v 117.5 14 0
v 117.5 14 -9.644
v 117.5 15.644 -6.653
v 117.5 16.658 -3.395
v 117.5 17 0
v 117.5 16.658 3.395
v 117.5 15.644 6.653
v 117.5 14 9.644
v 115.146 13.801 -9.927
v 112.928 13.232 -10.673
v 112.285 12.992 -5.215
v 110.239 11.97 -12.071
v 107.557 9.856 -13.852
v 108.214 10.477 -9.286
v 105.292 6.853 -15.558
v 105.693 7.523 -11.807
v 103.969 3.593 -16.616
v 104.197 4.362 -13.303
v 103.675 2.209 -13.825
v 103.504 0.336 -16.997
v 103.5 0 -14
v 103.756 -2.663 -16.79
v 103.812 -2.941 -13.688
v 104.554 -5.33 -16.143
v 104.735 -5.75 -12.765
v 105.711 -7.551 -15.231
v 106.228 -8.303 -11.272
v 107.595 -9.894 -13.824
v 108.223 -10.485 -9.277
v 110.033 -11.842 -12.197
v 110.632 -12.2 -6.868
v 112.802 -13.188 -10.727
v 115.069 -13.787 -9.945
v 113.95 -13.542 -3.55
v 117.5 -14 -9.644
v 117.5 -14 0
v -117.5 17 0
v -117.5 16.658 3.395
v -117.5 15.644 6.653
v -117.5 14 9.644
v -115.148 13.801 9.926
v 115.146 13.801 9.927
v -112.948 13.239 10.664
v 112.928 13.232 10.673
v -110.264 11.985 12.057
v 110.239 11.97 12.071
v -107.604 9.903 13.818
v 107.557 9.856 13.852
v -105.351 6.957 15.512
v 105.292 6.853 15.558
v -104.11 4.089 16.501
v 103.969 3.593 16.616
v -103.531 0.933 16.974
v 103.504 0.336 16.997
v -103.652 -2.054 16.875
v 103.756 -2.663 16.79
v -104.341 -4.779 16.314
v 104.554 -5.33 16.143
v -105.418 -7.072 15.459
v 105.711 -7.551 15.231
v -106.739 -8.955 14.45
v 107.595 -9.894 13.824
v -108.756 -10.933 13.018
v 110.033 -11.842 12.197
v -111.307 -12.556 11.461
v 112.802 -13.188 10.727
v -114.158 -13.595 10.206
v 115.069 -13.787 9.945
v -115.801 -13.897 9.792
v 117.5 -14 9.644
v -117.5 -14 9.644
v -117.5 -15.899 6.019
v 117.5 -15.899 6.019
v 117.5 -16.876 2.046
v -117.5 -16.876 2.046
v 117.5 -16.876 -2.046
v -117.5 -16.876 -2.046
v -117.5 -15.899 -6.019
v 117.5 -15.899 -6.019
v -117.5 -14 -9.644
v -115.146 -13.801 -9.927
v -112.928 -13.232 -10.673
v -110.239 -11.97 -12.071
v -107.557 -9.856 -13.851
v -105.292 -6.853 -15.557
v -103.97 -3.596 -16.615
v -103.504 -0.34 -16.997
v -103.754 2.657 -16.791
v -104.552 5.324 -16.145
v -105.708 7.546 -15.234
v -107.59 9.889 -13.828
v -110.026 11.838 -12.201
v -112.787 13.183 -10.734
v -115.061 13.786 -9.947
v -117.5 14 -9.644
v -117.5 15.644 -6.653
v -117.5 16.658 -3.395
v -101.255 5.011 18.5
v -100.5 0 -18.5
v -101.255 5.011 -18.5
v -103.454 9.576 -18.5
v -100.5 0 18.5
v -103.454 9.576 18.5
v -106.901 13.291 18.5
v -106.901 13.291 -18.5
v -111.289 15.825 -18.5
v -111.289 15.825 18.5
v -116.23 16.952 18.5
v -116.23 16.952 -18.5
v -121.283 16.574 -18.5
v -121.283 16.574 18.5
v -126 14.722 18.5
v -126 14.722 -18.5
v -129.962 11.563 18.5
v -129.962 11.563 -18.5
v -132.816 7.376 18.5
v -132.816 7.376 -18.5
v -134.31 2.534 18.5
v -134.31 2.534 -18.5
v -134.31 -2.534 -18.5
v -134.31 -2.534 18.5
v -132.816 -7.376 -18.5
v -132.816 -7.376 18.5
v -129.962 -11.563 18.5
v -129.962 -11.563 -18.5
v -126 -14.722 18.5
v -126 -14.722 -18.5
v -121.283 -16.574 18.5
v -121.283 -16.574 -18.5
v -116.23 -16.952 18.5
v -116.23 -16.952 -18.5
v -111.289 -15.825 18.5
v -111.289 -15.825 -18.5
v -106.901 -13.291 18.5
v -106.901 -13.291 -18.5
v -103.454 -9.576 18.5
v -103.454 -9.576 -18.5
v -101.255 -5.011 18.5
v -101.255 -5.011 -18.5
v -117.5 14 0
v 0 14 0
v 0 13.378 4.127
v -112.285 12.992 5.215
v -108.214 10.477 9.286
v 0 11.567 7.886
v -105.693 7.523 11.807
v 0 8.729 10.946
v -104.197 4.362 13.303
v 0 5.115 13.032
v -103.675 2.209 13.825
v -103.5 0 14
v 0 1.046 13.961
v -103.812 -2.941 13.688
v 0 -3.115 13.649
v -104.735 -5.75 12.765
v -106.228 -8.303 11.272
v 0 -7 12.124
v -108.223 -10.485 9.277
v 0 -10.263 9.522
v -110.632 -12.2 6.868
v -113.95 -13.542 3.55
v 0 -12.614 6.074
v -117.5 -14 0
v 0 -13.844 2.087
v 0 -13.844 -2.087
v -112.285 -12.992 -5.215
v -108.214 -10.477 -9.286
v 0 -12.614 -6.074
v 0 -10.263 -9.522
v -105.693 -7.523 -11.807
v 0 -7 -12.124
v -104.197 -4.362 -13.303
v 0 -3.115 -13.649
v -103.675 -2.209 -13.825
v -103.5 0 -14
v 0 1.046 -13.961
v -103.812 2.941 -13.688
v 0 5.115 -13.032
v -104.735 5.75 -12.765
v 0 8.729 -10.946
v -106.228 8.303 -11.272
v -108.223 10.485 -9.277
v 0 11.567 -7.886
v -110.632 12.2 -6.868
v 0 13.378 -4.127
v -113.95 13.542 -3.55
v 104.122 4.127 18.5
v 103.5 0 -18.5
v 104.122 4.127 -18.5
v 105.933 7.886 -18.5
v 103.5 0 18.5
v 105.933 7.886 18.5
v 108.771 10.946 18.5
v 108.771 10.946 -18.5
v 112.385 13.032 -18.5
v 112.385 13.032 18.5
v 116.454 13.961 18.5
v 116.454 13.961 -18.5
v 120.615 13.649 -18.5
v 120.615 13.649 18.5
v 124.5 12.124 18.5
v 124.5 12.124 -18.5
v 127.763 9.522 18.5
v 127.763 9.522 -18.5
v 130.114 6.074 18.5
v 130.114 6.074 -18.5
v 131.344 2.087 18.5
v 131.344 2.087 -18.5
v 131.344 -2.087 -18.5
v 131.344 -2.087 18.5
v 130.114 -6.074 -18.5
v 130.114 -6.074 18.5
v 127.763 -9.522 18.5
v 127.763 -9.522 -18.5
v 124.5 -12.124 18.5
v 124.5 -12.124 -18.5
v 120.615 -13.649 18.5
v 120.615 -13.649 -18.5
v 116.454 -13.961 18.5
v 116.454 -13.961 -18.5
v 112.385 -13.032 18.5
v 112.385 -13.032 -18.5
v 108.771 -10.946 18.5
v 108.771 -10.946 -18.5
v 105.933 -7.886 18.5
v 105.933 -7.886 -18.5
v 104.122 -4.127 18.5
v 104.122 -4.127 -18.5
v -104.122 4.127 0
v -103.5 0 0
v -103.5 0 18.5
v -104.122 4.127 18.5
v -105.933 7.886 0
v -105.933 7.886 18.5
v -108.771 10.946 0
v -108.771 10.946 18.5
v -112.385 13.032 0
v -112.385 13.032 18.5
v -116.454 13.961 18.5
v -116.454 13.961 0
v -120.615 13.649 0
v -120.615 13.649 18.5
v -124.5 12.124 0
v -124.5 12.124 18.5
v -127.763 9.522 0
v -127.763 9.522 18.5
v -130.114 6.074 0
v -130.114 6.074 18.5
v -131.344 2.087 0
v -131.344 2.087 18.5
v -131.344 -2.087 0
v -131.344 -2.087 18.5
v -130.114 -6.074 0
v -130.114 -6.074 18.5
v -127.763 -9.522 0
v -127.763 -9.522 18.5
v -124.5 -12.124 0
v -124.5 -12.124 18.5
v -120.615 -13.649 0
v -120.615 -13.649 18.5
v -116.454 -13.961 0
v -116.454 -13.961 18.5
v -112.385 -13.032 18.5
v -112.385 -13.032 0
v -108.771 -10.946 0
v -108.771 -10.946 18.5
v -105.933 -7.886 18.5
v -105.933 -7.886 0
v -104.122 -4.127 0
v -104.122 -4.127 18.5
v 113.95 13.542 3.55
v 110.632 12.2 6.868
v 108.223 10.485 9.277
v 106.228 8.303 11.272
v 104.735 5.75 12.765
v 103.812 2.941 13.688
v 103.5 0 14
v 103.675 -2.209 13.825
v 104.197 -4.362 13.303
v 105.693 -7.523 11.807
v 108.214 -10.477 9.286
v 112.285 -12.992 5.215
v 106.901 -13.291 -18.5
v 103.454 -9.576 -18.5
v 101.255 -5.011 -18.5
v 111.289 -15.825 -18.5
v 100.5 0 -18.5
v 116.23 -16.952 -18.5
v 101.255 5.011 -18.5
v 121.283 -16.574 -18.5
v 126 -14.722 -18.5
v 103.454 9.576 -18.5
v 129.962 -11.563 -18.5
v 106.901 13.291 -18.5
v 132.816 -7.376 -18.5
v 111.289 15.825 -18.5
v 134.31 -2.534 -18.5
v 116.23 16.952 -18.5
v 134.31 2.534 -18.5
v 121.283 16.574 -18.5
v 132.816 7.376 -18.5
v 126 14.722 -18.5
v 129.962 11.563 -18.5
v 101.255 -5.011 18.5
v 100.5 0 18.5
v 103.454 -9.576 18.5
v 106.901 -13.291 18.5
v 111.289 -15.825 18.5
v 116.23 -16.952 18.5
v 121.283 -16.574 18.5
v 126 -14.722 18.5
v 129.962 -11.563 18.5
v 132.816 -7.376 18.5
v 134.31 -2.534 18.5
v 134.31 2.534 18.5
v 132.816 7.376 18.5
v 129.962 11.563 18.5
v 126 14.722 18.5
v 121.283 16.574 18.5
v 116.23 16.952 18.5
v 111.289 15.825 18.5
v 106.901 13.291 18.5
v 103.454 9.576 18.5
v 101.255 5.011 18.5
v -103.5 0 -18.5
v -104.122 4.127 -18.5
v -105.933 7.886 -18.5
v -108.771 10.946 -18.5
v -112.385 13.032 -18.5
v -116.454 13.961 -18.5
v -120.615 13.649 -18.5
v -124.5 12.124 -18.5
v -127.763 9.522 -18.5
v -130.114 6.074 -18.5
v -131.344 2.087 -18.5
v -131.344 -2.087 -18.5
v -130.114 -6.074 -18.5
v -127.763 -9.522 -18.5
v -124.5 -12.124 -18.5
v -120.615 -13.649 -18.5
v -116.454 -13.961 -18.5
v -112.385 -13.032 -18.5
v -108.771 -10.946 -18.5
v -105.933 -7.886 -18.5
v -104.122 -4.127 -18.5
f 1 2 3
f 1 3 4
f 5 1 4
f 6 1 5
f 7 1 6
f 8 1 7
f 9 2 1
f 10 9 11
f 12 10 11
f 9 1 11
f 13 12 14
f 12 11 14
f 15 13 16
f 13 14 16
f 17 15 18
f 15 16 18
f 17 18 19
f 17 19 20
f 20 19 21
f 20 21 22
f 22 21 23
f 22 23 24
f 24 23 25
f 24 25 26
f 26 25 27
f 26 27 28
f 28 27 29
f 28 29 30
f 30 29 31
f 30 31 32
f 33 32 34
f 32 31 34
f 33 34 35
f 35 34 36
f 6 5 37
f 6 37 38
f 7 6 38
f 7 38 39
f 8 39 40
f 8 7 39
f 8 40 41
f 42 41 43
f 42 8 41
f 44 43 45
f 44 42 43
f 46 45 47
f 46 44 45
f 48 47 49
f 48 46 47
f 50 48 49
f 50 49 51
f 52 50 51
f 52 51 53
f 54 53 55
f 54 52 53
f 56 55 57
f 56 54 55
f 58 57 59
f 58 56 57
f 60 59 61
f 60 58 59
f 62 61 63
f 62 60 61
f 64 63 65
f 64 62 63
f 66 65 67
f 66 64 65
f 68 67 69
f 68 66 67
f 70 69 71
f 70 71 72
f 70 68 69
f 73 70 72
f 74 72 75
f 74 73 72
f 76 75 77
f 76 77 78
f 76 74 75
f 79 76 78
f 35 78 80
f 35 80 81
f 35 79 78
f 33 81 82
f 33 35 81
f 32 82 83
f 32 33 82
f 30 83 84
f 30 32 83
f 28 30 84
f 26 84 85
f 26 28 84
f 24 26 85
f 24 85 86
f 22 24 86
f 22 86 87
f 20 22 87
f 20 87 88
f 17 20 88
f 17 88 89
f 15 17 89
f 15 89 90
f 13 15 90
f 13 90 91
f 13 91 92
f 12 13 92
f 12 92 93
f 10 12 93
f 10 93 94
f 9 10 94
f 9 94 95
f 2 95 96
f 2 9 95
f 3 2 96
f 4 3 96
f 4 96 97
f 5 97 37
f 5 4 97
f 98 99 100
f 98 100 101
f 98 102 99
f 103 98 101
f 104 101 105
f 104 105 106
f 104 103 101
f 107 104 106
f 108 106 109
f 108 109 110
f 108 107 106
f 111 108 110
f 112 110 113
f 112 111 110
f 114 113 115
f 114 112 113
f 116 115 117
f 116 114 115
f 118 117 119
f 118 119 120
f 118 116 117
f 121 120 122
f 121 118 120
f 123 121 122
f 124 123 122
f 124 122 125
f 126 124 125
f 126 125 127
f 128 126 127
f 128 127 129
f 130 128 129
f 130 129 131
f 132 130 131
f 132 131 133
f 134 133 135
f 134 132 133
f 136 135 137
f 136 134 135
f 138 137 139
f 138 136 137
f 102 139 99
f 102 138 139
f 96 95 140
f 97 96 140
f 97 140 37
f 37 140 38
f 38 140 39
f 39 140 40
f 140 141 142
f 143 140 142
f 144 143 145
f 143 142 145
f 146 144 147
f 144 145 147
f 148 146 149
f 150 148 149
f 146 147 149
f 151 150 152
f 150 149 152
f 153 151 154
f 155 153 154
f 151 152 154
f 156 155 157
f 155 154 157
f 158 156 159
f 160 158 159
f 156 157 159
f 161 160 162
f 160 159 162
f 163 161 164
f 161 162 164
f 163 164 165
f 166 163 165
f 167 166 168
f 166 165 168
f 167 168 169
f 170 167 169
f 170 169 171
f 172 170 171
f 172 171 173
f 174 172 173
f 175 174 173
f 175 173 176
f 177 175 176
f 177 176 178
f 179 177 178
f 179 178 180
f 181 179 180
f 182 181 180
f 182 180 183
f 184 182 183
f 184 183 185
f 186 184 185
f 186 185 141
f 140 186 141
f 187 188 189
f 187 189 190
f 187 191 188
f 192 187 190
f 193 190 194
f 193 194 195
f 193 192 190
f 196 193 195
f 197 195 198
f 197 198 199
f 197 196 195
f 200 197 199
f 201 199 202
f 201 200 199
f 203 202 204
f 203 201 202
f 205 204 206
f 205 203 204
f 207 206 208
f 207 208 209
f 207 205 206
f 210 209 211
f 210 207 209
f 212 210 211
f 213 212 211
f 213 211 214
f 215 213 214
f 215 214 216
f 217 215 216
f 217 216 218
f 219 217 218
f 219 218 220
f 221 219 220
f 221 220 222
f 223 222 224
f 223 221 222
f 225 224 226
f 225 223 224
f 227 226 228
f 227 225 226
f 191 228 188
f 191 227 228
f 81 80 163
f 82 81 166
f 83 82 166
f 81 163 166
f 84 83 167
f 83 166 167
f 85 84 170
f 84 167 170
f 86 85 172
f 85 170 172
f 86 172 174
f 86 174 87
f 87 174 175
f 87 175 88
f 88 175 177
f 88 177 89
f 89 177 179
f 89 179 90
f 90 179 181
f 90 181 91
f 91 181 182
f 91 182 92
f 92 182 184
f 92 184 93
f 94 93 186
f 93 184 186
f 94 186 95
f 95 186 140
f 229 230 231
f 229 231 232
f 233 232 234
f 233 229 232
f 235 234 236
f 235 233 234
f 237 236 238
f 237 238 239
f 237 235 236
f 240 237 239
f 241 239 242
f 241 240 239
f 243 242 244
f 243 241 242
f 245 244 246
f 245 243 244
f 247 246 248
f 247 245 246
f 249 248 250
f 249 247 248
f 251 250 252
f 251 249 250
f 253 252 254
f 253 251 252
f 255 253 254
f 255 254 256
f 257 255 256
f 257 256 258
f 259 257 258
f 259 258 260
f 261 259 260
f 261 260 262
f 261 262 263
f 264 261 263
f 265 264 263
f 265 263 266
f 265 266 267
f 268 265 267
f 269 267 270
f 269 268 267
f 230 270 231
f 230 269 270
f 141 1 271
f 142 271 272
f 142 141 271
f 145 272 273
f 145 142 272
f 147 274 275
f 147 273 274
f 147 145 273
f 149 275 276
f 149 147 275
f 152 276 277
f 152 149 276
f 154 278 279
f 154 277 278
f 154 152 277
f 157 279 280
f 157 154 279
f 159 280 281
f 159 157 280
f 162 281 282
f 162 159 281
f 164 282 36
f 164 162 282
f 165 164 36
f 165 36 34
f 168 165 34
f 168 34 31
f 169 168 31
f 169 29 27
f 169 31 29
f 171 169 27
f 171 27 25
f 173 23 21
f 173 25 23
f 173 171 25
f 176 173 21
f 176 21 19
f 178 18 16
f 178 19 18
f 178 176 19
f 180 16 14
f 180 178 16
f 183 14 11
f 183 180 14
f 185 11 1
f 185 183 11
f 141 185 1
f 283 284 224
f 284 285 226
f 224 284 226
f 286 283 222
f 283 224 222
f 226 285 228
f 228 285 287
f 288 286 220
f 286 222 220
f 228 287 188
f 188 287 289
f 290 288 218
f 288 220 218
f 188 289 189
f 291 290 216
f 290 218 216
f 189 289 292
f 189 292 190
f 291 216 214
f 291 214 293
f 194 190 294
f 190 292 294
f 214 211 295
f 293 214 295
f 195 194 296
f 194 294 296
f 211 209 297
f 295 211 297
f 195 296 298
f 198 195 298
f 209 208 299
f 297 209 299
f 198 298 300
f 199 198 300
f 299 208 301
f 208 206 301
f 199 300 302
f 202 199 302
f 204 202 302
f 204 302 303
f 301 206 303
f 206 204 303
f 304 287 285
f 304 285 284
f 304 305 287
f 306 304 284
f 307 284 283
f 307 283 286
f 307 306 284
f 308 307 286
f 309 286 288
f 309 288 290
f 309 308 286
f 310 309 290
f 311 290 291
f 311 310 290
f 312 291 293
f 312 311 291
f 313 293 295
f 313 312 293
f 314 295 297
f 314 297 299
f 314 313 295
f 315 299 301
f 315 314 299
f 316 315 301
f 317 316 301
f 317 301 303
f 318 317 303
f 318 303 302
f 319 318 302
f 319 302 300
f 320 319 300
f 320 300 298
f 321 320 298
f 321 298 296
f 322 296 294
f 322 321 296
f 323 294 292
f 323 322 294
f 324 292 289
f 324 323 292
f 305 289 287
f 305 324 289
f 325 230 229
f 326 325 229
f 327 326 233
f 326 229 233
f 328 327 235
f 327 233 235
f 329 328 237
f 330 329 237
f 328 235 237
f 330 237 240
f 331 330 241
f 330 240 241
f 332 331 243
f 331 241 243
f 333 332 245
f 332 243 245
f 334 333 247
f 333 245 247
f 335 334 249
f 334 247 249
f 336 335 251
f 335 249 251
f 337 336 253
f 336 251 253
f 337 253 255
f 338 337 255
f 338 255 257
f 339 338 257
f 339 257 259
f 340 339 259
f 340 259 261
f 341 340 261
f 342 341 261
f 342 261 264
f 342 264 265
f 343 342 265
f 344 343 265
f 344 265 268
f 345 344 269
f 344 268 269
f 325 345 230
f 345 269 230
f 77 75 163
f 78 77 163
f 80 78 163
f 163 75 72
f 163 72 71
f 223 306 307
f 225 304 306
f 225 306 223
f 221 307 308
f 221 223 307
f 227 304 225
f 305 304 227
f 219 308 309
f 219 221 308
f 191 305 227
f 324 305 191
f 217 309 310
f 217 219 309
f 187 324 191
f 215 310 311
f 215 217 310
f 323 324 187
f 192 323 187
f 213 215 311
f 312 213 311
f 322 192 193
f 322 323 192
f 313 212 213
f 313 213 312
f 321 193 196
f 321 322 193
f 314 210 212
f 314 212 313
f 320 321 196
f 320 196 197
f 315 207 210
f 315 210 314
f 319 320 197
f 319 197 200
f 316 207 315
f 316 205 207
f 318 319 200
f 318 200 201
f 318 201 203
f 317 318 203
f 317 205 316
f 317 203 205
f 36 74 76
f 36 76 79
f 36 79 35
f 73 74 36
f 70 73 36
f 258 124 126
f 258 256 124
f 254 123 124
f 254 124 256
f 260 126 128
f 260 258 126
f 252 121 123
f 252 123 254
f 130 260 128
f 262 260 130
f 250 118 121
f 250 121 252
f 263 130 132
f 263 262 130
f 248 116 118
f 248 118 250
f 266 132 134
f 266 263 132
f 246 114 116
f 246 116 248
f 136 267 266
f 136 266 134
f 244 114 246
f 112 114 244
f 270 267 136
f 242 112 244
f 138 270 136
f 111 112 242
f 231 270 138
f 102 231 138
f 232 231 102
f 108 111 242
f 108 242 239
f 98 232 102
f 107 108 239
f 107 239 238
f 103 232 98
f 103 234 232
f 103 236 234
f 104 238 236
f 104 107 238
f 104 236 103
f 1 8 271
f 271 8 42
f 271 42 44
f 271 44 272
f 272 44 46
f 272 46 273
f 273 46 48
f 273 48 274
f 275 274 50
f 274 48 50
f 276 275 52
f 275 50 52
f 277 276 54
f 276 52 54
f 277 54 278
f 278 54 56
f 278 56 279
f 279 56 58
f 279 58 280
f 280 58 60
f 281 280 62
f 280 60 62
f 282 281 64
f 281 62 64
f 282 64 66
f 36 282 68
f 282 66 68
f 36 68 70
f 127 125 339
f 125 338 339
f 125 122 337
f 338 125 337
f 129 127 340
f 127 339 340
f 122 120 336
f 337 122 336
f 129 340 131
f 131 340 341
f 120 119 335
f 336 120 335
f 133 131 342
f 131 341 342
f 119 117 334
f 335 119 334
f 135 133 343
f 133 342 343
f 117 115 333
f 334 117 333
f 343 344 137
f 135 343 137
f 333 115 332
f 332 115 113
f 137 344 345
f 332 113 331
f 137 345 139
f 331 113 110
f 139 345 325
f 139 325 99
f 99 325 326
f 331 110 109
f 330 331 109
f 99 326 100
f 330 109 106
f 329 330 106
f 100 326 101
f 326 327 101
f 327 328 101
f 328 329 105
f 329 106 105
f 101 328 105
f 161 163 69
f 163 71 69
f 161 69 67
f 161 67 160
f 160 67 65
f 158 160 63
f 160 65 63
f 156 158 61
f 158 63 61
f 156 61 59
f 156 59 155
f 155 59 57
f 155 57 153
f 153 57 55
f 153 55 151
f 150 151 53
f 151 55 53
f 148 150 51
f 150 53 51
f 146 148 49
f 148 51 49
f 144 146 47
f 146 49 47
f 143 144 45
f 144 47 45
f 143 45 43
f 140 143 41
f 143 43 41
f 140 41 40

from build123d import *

# Parameters (mm, degrees)
F0_R          = 17
F0_R_2        = 14
F1_DEPTH      = 18.5
F1_DEPTH_BACK = 18.5
F3_R          = 17
F3_R_2        = 14
F4_DEPTH      = 117.5
F4_DEPTH_BACK = 117.5
F5_R          = 14
F6_DEPTH      = 60


with BuildPart() as f1:
    # F0 (on Top) → F1 (new body, two sides)
    with BuildSketch(Plane.XY) as f1_sk:
        with Locations((-117.5, 0)):
            Circle(F0_R)
        with Locations((-117.5, 0)):
            Circle(F0_R_2, mode=Mode.SUBTRACT)
    extrude(amount=F1_DEPTH)
    extrude(f1_sk.sketch, amount=-F1_DEPTH_BACK)


with BuildPart() as f1b:
    # F0 (on Top) → F1, piece 2 (new body, two sides)
    with BuildSketch(Plane.XY) as f1_2_sk:
        with BuildLine():
            ThreePointArc((134.5, 0), (117.5, 17), (100.5, 0))
            ThreePointArc((100.5, 0), (117.5, -17), (134.5, 0))
        make_face()
        with BuildLine():
            ThreePointArc((131.5, 0), (117.5, -14), (103.5, 0))
            ThreePointArc((103.5, 0), (117.5, 14), (131.5, 0))
        make_face(mode=Mode.SUBTRACT)
    extrude(amount=F1_DEPTH)
    extrude(f1_2_sk.sketch, amount=-F1_DEPTH_BACK)


with BuildPart() as f4:
    # F3 (on line) → F4 (new body, two sides)
    with BuildSketch(Plane.YZ) as f4_sk:
        Circle(F3_R)
        Circle(F3_R_2, mode=Mode.SUBTRACT)
    extrude(amount=F4_DEPTH)
    extrude(f4_sk.sketch, amount=-F4_DEPTH_BACK)

    # F5 (on face) → F6 (cut)
    with BuildSketch(Plane.XY.offset(18.5)):
        with Locations((-117.5, 0)):
            Circle(F5_R)
        with Locations((117.5, 0)):
            Circle(F5_R)
    extrude(amount=-F6_DEPTH, mode=Mode.SUBTRACT)


solid = Compound([f1.part, f1b.part, f4.part])
